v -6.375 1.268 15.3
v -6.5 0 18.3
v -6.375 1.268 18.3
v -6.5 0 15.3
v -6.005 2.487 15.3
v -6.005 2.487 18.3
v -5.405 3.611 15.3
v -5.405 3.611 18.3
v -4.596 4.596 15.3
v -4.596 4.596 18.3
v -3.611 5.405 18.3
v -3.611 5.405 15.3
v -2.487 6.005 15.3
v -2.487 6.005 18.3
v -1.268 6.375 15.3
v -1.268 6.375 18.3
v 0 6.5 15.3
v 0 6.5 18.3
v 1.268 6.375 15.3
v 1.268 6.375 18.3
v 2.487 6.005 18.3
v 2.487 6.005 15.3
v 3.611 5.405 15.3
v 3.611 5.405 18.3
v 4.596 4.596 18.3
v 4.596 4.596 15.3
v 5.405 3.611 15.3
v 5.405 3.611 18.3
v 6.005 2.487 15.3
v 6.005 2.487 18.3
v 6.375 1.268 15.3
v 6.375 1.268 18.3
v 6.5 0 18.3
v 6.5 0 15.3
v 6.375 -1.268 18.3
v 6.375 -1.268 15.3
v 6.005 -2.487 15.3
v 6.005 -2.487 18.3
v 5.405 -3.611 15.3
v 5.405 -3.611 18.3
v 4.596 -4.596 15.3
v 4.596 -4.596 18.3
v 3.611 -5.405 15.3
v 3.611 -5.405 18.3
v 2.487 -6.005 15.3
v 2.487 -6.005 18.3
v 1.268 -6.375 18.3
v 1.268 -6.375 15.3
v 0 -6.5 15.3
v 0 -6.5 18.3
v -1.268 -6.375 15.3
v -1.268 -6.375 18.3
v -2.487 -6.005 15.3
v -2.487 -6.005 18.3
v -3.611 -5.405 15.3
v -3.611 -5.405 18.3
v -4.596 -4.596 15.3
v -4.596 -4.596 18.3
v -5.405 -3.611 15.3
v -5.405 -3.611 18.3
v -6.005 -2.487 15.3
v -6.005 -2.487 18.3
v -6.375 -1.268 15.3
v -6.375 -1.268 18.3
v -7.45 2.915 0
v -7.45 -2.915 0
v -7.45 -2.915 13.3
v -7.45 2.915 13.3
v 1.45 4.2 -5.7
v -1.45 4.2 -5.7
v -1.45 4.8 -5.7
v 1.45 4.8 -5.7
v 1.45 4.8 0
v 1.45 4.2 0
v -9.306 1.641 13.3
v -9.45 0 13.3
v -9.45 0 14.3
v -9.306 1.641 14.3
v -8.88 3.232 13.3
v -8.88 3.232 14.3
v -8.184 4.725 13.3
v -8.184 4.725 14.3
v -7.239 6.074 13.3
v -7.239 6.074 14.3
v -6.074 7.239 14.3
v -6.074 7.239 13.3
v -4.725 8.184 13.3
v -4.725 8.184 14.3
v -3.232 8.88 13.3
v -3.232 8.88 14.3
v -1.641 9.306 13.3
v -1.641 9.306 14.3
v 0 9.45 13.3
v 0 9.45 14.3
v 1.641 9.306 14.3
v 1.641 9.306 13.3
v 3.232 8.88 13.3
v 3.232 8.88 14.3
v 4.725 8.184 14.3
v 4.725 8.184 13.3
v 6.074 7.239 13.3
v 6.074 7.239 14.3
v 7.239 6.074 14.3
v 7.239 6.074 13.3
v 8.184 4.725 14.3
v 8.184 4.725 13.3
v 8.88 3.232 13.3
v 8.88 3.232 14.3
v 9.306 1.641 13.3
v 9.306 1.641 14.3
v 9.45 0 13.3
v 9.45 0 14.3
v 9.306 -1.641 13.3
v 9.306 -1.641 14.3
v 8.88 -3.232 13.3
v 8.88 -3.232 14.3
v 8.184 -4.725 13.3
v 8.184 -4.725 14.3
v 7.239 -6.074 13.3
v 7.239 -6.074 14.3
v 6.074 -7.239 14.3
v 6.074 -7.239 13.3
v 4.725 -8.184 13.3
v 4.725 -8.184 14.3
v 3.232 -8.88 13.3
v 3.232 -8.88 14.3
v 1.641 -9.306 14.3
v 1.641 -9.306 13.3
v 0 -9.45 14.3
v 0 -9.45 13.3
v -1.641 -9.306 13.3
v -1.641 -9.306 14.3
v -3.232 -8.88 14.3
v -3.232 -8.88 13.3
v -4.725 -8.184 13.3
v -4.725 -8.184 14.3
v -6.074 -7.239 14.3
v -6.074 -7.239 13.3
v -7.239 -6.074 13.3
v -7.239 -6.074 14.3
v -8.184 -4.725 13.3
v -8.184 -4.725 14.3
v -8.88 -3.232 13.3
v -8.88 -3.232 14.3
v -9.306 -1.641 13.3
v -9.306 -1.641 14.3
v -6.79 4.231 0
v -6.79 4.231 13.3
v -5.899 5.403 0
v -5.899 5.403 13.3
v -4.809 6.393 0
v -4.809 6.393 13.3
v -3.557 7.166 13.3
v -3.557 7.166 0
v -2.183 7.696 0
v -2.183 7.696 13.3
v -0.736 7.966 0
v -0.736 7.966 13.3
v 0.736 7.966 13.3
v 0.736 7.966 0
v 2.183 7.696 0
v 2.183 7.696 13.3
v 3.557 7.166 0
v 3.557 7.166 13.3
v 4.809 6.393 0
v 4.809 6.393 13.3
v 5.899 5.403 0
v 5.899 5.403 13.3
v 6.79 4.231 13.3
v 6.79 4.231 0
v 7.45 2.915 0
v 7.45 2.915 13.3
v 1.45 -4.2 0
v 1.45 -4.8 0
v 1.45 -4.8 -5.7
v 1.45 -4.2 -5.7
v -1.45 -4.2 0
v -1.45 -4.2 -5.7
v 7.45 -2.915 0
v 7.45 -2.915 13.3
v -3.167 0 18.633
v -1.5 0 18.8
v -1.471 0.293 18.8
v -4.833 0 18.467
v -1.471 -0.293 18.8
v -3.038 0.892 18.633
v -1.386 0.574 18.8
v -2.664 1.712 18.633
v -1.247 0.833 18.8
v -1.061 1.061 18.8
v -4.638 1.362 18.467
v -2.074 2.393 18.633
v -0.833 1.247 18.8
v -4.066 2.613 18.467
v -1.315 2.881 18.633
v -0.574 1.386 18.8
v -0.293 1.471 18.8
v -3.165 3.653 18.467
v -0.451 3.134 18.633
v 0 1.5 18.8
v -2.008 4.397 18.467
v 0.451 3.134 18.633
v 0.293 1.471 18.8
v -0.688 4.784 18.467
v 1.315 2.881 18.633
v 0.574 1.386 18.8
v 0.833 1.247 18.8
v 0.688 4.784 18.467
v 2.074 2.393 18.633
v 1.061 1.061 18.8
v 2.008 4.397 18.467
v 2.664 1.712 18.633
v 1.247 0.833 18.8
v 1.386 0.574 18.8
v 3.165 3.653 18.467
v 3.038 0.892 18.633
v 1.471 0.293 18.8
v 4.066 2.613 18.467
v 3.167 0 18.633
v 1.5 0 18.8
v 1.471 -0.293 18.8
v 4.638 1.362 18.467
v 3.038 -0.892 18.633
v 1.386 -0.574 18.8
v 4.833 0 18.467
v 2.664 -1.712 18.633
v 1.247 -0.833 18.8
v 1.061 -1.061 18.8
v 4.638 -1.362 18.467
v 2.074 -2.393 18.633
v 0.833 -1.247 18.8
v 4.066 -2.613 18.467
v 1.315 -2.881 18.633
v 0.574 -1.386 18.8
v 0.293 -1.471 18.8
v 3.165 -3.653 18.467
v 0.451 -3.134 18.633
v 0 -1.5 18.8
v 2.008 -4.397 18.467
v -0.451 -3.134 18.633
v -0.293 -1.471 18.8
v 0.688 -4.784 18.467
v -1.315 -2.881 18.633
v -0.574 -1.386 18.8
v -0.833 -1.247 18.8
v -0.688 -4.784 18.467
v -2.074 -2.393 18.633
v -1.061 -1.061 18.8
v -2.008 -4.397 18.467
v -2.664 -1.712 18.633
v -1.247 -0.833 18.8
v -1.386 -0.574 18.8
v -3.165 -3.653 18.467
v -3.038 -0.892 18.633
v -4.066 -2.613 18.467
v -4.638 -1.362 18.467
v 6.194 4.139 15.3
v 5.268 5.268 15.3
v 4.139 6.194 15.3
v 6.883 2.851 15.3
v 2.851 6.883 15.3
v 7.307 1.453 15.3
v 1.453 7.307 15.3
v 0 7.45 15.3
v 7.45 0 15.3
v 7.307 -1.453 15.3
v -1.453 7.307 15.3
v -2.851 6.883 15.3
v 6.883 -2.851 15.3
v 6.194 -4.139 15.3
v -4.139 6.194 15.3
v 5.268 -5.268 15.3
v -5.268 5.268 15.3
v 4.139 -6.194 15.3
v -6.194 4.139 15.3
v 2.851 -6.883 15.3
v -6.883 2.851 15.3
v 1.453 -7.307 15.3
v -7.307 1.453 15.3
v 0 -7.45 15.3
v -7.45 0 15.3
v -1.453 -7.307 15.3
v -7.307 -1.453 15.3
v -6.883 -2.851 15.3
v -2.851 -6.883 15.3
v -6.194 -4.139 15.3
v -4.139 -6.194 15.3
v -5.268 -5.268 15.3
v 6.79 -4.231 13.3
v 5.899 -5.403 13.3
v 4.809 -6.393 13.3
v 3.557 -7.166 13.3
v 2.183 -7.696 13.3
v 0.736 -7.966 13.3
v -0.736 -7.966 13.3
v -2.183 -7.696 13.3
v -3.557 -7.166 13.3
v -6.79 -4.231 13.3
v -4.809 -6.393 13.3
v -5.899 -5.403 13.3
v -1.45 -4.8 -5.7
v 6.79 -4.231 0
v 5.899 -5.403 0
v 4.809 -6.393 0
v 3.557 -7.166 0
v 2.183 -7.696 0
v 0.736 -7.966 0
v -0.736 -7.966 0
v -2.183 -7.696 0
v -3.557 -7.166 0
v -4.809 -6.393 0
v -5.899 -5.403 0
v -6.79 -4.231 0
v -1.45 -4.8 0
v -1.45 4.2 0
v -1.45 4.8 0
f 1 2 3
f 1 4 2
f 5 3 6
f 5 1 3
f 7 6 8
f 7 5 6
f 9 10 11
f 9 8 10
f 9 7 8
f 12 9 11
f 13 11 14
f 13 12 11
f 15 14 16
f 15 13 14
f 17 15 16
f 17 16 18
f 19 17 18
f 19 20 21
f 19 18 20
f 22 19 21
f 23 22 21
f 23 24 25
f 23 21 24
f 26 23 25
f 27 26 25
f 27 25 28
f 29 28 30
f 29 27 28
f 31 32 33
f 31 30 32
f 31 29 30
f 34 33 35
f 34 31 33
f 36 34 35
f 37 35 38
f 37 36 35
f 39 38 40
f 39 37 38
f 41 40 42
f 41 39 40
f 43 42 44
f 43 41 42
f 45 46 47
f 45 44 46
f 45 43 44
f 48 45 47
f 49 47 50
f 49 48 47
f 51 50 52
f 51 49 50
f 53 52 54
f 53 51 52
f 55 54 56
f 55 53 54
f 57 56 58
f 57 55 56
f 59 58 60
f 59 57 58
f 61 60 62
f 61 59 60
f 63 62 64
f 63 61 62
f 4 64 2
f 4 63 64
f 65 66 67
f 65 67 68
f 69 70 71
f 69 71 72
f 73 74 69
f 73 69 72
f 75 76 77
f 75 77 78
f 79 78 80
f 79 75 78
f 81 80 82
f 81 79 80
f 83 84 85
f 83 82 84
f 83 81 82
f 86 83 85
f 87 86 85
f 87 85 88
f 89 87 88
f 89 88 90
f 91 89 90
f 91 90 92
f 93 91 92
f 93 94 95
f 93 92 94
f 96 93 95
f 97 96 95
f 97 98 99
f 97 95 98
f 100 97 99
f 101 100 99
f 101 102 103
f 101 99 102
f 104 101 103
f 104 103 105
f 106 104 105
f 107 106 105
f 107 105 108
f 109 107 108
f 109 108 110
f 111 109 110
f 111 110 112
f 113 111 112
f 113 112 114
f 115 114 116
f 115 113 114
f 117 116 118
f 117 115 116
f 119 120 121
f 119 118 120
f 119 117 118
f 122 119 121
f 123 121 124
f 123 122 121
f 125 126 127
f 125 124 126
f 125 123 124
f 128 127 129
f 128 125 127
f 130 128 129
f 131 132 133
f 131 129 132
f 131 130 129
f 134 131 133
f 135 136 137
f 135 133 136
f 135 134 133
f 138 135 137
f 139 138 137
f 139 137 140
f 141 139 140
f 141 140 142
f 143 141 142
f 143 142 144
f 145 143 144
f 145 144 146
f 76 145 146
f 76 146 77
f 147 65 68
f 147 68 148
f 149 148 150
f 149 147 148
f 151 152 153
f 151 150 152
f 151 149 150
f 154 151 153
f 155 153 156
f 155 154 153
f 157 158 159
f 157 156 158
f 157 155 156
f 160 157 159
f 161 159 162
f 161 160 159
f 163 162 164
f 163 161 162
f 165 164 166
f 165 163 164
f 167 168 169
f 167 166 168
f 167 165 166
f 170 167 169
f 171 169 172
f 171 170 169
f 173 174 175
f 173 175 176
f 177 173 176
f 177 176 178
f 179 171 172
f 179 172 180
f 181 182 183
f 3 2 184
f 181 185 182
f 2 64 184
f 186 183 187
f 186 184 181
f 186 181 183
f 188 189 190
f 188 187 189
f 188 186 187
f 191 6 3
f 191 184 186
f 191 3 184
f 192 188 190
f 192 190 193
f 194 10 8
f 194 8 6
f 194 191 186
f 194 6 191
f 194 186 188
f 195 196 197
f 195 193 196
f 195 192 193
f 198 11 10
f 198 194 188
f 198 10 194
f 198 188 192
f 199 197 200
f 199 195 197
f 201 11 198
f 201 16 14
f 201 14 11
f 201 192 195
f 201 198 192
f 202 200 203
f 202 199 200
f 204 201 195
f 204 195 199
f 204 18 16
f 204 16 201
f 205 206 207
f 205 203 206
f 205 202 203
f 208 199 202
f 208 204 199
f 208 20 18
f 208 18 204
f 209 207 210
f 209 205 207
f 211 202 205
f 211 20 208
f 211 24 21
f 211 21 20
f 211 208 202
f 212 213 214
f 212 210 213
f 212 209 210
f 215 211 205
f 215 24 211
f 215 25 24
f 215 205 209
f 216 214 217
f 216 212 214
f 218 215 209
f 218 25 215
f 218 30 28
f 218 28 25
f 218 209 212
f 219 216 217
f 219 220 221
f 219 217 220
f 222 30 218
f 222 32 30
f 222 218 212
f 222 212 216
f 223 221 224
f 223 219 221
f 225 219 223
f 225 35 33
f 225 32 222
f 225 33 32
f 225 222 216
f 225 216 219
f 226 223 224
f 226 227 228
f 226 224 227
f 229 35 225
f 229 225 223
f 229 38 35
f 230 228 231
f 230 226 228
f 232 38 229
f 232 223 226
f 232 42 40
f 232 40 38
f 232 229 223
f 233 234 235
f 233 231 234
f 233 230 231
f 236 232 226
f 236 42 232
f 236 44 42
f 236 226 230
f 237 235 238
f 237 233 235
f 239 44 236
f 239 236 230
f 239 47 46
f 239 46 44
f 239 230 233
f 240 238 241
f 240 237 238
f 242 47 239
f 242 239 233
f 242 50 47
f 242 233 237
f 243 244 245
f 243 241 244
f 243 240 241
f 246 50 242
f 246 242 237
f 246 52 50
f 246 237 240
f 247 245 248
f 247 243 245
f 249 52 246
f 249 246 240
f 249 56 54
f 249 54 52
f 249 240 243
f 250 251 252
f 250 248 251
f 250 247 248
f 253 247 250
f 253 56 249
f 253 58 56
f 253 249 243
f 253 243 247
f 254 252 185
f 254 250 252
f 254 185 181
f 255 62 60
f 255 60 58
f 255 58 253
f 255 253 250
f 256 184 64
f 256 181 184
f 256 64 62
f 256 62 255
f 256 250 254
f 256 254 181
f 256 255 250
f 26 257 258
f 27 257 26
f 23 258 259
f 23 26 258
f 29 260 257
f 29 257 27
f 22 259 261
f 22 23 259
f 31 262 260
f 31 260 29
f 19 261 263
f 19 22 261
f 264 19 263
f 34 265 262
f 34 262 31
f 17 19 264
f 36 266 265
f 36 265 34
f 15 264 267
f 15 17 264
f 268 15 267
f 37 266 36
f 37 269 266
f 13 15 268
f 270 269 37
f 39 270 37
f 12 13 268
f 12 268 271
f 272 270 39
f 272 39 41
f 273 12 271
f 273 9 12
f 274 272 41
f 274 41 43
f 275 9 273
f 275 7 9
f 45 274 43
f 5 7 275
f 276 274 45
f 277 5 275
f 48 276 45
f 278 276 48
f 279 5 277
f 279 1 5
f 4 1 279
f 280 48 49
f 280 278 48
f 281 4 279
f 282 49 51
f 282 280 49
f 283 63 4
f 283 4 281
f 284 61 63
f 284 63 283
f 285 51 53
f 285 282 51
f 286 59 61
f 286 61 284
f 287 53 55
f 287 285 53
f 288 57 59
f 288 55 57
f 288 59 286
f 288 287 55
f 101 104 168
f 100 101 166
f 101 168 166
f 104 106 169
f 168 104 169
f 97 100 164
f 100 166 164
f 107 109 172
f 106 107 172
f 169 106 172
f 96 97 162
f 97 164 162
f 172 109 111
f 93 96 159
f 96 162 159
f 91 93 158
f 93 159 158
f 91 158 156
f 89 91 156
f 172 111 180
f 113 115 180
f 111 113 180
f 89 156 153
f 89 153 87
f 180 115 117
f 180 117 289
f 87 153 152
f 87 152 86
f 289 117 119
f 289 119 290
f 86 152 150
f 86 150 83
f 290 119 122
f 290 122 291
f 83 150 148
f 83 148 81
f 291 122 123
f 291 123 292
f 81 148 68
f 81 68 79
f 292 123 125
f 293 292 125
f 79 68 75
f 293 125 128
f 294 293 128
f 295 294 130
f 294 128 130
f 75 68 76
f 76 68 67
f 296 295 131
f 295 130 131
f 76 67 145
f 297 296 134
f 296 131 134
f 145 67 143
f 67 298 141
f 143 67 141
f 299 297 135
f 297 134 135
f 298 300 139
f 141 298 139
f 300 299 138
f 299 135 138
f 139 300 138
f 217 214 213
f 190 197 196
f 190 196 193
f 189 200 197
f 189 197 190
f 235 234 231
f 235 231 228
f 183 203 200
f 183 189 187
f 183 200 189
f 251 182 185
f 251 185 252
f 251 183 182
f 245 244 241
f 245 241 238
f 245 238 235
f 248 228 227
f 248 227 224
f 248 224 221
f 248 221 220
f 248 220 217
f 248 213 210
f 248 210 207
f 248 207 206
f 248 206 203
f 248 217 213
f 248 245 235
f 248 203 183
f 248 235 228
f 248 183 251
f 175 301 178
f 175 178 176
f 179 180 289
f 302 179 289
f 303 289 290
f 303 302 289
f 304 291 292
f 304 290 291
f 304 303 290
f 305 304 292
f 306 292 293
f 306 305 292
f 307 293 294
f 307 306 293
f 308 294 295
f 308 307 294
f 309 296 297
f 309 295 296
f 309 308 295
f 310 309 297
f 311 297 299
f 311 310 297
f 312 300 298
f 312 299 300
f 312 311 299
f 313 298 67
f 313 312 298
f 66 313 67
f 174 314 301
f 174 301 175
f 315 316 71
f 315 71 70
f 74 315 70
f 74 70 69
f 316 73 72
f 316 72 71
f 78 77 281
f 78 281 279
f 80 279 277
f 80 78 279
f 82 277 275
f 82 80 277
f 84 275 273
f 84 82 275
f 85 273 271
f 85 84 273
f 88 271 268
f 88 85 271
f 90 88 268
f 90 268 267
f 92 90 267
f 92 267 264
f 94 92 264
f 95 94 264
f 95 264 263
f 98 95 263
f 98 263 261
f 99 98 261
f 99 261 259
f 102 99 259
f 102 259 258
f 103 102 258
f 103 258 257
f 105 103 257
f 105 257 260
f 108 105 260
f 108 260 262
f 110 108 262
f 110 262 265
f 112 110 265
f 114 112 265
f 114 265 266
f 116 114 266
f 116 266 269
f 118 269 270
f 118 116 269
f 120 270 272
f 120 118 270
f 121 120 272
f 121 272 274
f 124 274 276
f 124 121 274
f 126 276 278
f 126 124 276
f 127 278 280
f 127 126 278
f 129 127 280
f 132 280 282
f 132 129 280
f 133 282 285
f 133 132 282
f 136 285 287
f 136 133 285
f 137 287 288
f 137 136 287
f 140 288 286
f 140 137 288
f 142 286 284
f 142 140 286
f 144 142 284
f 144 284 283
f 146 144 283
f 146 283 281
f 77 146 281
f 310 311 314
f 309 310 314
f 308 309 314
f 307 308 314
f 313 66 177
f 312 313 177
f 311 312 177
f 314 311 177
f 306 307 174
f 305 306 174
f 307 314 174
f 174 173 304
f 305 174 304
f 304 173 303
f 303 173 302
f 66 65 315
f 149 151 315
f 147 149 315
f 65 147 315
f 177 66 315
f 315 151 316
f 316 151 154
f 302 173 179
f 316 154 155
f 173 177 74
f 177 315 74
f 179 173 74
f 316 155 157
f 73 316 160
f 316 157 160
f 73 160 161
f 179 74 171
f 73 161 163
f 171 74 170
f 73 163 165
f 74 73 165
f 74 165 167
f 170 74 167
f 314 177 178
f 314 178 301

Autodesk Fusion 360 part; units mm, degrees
sketch "Sketch1" plane through (0, 0, 0) normal (0, 0, 1) x (1, 0, 0)
  circle A0 centre (0, 0) radius 8
  line L0 (7.45, -9) -> (-7.45, -9)
  line L1 (-7.45, -9) -> (-7.45, 9)
  line L2 (-7.45, 9) -> (7.45, 9)
  line L3 (7.45, 9) -> (7.45, -9)
  line L4 (7.45, -9) -> (-7.45, 9) construction
  line L5 (-7.45, -9) -> (7.45, 9) construction
  dimension "d1" = 16
  dimension "d2" = 14.9
extrude "Extrude1" add sketch "Sketch1" along normal blind 13.3 contours A0 L1 L3
sketch "Sketch2" plane through (0, 0, 13.3) normal (0, 0, 1) x (-1, 0, 0)
  arc A0 (7.45, 2.915) -> (-7.45, 2.915) centre (0, 0) ccw
  line L0 (-7.45, 2.915) -> (-7.45, -2.915)
  arc A1 (-7.45, -2.915) -> (7.45, -2.915) centre (0, 0) ccw
  line L1 (7.45, -2.915) -> (7.45, 2.915)
  circle A2 centre (0, 0) radius 9.45
  dimension "d5" = 18.9
extrude "Extrude2" add sketch "Sketch2" along normal blind 2 contours A0 L0 A1 L1 | A2
chamfer "Chamfer1" distance 2 distance2 1 1 edges at (8.8105, 3.4173, 15.3) measured on face at (-3.5181, 1.5655, 15.3)
sketch "Sketch3" plane through (0, 0, 15.3) normal (0, 0, 1) x (-1, 0, 0)
  circle A0 centre (0, 0) radius 7.45
  circle A1 centre (0, 0) radius 6.5
  dimension "d10" = 13
extrude "Extrude3" add sketch "Sketch3" along normal blind 3.5 contours A1
chamfer "Chamfer2" distance 5 distance2 0.5 1 edges at (6.0601, 2.3505, 18.8) measured on face at (-1.9521, 0.9401, 18.8)
sketch "Sketch4" plane through (0, 0, 0) normal (0, 0, -1) x (1, 0, 0)
  arc A0 (7.45, 2.915) -> (-7.45, 2.915) centre (0, 0) ccw
  line L0 (-7.45, 2.915) -> (-7.45, -2.915)
  arc A1 (-7.45, -2.915) -> (7.45, -2.915) centre (0, 0) ccw
  line L1 (7.45, -2.915) -> (7.45, 2.915)
  line L2 (0, 8) -> (0, 4.8) construction
  line L3 (0, -8) -> (0, -4.8) construction
  line L4 (0, -4.8) -> (0, -4.2) construction
  line L5 (0, 4.8) -> (0, 4.2) construction
  line L6 (1.45, 4.2) -> (-1.45, 4.2)
  line L7 (-1.45, 4.2) -> (-1.45, 4.8)
  line L8 (-1.45, 4.8) -> (1.45, 4.8)
  line L9 (1.45, 4.8) -> (1.45, 4.2)
  line L10 (1.45, 4.2) -> (-1.45, 4.8) construction
  line L11 (-1.45, 4.2) -> (1.45, 4.8) construction
  line L12 (1.45, -4.8) -> (-1.45, -4.8)
  line L13 (-1.45, -4.8) -> (-1.45, -4.2)
  line L14 (-1.45, -4.2) -> (1.45, -4.2)
  line L15 (1.45, -4.2) -> (1.45, -4.8)
  line L16 (1.45, -4.8) -> (-1.45, -4.2) construction
  line L17 (-1.45, -4.8) -> (1.45, -4.2) construction
  point P0 (0, 4.5)
  point P1 (0, -4.5)
  dimension "d15" = 3.2
  dimension "d16" = 3.2
  dimension "d17" = 0.6
  dimension "d18" = 0.6
  dimension "d19" = 2.9
  dimension "d20" = 0.6
  dimension "d21" = 2.9
  dimension "d22" = 0.6
extrude "Extrude4" add sketch "Sketch4" along normal blind 5.7 contours L6 L7 L8 L9 | L12 L13 L14 L15
